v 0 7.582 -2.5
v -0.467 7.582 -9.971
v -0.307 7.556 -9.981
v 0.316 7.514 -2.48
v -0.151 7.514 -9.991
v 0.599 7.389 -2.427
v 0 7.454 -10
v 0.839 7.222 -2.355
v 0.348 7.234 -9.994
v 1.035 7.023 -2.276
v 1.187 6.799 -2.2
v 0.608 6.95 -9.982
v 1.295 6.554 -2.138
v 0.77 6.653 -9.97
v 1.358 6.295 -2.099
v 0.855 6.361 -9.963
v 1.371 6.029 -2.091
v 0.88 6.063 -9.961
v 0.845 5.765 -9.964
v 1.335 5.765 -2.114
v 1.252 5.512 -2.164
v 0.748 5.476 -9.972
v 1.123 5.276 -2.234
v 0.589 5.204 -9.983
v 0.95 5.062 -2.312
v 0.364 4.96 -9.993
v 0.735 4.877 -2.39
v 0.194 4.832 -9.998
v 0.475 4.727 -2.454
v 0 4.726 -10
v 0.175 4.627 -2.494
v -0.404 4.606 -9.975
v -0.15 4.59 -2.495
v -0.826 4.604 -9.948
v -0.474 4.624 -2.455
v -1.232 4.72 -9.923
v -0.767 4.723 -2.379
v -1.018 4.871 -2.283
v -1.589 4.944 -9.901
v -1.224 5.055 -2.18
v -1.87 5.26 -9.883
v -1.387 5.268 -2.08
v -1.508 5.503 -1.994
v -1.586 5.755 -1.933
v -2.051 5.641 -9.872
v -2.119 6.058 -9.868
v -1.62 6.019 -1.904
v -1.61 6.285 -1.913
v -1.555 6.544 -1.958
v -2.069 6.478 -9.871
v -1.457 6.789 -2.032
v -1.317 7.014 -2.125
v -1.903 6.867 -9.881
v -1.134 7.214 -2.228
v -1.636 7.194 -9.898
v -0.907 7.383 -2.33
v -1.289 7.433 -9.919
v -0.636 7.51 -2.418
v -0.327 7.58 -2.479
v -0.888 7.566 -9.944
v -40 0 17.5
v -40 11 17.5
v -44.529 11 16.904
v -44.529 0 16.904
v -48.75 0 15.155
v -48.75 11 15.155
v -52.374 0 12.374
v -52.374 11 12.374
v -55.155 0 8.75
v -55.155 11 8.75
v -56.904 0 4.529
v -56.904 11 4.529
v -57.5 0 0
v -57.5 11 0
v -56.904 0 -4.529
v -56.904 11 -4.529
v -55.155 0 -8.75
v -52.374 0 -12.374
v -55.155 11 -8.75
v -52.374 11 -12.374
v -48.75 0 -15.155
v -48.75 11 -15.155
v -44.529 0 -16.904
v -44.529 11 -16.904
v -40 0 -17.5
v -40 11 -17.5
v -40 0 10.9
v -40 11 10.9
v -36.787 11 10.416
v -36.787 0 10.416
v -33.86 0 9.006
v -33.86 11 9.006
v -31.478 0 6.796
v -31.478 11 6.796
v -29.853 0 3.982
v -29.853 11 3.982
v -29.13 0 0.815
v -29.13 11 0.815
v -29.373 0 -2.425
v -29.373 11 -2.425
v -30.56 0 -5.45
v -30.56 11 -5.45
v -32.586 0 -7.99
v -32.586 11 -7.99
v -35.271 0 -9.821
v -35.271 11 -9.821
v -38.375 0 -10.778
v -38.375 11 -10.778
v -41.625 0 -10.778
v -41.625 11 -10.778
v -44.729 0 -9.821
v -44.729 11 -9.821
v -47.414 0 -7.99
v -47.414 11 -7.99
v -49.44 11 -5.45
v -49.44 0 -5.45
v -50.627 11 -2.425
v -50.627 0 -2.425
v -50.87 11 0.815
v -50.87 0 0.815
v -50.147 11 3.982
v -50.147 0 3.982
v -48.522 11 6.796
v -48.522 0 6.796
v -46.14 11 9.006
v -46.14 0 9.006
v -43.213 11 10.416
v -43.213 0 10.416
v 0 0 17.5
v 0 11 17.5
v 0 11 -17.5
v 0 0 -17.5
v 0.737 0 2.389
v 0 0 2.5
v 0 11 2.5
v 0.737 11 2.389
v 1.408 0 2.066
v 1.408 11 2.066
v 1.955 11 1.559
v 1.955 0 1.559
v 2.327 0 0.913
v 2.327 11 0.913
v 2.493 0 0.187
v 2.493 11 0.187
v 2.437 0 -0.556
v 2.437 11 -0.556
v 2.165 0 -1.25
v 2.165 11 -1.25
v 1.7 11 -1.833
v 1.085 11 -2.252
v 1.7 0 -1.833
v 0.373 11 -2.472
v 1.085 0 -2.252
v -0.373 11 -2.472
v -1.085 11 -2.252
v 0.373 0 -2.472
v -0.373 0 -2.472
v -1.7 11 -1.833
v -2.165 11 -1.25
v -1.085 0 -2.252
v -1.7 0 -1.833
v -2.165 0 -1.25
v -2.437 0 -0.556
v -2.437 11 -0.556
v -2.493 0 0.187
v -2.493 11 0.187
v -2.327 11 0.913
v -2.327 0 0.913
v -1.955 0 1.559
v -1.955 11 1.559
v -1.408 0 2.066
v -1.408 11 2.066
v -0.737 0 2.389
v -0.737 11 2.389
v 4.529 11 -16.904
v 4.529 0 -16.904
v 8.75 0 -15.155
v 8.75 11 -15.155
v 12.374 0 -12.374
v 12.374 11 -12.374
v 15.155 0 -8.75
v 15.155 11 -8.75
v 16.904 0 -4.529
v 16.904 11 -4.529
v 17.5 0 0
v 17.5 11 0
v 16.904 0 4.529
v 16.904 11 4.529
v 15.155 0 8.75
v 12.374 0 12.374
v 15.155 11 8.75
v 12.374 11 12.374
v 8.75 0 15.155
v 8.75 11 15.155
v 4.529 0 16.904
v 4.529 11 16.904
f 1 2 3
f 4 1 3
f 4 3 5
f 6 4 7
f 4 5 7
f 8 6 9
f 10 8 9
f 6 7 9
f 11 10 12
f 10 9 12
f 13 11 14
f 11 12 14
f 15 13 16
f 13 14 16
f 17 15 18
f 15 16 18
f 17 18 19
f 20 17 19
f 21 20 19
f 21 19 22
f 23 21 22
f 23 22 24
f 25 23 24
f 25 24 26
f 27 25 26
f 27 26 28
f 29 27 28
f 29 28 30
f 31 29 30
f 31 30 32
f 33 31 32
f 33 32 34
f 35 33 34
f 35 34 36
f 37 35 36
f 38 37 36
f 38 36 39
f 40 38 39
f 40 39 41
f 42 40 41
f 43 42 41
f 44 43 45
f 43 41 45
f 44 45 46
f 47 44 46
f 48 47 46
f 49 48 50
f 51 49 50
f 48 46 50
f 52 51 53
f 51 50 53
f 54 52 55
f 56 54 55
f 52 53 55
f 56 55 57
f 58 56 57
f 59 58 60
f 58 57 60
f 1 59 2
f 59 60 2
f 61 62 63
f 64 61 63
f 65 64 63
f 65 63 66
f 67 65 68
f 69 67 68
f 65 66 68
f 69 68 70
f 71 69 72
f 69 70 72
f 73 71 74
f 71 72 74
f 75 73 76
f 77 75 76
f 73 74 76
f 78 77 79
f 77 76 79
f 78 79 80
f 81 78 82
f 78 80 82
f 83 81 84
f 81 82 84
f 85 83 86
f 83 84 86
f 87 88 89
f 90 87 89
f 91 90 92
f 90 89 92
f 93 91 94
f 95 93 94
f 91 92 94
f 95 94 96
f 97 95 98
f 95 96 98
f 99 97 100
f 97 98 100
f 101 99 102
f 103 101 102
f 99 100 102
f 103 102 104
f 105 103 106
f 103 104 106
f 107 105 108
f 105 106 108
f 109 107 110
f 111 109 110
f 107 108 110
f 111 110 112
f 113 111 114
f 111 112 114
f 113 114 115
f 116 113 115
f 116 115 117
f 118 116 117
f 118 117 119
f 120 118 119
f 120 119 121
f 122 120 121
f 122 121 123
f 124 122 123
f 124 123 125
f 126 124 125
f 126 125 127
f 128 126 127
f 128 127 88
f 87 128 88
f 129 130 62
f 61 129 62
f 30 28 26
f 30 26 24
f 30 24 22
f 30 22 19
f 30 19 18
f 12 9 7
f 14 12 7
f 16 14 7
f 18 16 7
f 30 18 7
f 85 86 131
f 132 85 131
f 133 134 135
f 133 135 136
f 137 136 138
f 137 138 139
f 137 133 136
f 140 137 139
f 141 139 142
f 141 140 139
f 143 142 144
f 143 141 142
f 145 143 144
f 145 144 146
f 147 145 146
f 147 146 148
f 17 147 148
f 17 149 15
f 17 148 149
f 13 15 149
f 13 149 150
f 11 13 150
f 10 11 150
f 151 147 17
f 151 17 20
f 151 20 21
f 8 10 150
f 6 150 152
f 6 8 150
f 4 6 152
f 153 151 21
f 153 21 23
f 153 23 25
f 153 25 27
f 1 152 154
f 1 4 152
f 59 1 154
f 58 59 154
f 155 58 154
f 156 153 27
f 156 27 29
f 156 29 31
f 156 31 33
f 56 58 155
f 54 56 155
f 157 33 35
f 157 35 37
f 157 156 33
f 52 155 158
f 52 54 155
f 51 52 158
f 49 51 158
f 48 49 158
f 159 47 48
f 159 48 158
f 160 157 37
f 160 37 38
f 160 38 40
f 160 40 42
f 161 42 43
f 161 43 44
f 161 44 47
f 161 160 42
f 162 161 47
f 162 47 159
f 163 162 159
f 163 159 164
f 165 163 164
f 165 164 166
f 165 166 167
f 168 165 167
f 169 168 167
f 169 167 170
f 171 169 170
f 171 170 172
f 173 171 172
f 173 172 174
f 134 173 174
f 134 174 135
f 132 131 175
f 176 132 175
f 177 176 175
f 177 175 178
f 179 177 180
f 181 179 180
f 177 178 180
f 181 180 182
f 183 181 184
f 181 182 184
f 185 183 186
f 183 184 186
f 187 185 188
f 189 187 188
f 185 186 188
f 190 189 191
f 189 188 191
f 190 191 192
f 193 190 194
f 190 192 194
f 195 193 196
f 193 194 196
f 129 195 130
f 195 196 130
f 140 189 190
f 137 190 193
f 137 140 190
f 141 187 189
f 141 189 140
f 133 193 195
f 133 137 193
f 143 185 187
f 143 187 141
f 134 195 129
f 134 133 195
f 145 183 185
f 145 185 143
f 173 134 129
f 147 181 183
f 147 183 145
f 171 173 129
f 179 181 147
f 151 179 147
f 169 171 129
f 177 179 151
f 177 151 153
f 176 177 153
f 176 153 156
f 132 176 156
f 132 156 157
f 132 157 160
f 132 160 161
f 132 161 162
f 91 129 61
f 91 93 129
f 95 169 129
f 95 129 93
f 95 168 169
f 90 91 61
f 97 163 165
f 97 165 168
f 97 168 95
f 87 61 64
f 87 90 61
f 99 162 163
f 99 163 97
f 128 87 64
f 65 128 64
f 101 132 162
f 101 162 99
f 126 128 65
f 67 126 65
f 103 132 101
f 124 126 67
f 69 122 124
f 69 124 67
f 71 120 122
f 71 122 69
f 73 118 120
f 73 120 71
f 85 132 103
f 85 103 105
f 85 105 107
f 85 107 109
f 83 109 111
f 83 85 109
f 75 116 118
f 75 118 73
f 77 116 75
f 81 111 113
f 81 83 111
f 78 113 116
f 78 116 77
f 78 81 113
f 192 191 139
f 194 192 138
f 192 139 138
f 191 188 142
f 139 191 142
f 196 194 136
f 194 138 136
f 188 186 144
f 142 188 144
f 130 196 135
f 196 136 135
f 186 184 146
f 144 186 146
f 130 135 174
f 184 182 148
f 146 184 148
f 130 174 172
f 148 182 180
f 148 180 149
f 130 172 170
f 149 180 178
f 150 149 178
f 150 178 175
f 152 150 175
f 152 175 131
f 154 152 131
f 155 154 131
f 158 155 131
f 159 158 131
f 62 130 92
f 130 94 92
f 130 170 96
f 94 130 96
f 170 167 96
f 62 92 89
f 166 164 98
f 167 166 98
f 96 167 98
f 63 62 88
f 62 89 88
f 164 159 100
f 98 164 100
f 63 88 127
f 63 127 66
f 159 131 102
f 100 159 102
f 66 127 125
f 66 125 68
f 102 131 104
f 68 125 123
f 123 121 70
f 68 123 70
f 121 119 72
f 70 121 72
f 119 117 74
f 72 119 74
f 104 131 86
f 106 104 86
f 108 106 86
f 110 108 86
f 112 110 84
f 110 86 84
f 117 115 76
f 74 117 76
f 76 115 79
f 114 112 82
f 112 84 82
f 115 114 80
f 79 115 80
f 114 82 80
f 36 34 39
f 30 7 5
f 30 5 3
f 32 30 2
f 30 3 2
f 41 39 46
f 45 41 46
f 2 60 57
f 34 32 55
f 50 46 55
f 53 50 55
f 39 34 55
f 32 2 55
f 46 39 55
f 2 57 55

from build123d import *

# Parameters (mm, degrees)
SKETCH1_R               = 2
SKETCH1_R_2             = 2.5
BOSS_EXTRUDE1_DEPTH     = 11
CUT_EXTRUDE1_REACH      = 22.585
CUT_EXTRUDE1_END_RADIUS = 2.5
SKETCH2_R               = 1.5
BOSS_EXTRUDE2_DEPTH     = 11
SKETCH4_R               = 10.9
CUT_EXTRUDE2_DEPTH      = 37.710978084


with BuildPart() as part:
    # Sketch1 → Boss-Extrude1 (new body)
    with BuildSketch(Plane(origin=(0, 0, 0), x_dir=(1, 0, 0), z_dir=(0, 1, 0))):
        with BuildLine():
            Line((-1.245136187, 9.922178988), (-40, 7.5))
            ThreePointArc((-40, 7.5), (-47.5, 0), (-40, -7.5))
            Line((-40, -7.5), (-1.245136187, -9.922178988))
            Line((-1.245136187, -9.922178988), (0, -10))
            ThreePointArc((0, -10), (10, 0), (0, 10))
            Line((0, 10), (-1.245136187, 9.922178988))
        make_face()
        with Locations(Location((-40, 0, 0), (0, 0, 270))):  # turned: the seam where the file's is
            Circle(SKETCH1_R, mode=Mode.SUBTRACT)
        with Locations(Location((0, 0, 0), (0, 0, 270))):  # turned: the seam where the file's is
            Circle(SKETCH1_R_2, mode=Mode.SUBTRACT)
    extrude(amount=BOSS_EXTRUDE1_DEPTH)

    # Cut-Extrude1: up to this cylinder (the profile starts outside it)
    cut_extrude1_end = Plane(origin=(0, 6.089956, 0), z_dir=(0, -1, 0)) * Cylinder(CUT_EXTRUDE1_END_RADIUS, 51.17, mode=Mode.PRIVATE)
    # Sketch2 → Cut-Extrude1 (cut, up to the surface)
    with BuildSketch(Plane(origin=(-0.622568093, 0, -9.961089494), x_dir=(-0.998052578, 0, 0.062378286), z_dir=(-0.062378286, 0, -0.998052578)), mode=Mode.PRIVATE) as cut_extrude1_sk1:
        with Locations(Location((0, 6.089956485, 0), (0, 0, 95.967470529))):  # turned: the seam where the file's is
            Circle(SKETCH2_R)
    cut_extrude1_tool1 = extrude(cut_extrude1_sk1.sketch, amount=-CUT_EXTRUDE1_REACH, mode=Mode.PRIVATE) - cut_extrude1_end
    add(cut_extrude1_tool1.solids().sort_by_distance((-0.622568, 6.089956, -9.961089))[0], mode=Mode.SUBTRACT)

    # Sketch3 → Boss-Extrude2 (add)
    with BuildSketch(Plane(origin=(0, 11, 0), x_dir=(1, 0, 0), z_dir=(0, 1, 0))):
        with BuildLine():
            Line((0, -17.5), (-40, -17.5))
            ThreePointArc((-40, -17.5), (-57.5, 0), (-40, 17.5))
            Line((-40, 17.5), (0, 17.5))
            ThreePointArc((0, 17.5), (17.5, 0), (0, -17.5))
        make_face()
        with BuildLine():
            Line((0, 10), (-40, 7.5))
            ThreePointArc((-40, 7.5), (-47.5, 0), (-40, -7.5))
            Line((-40, -7.5), (0, -10))
            ThreePointArc((0, -10), (10, 0), (0, 10))
        make_face(mode=Mode.SUBTRACT)
    extrude(amount=-BOSS_EXTRUDE2_DEPTH)

    # Sketch4 → Cut-Extrude2 (cut)
    with BuildSketch(Plane(origin=(0, 11, 0), x_dir=(1, 0, 0), z_dir=(0, 1, 0))):
        with Locations(Location((-40, 0, 0), (0, 0, 270))):  # turned: the seam where the file's is
            Circle(SKETCH4_R)
    extrude(amount=-CUT_EXTRUDE2_DEPTH, mode=Mode.SUBTRACT)


solid = part.part
